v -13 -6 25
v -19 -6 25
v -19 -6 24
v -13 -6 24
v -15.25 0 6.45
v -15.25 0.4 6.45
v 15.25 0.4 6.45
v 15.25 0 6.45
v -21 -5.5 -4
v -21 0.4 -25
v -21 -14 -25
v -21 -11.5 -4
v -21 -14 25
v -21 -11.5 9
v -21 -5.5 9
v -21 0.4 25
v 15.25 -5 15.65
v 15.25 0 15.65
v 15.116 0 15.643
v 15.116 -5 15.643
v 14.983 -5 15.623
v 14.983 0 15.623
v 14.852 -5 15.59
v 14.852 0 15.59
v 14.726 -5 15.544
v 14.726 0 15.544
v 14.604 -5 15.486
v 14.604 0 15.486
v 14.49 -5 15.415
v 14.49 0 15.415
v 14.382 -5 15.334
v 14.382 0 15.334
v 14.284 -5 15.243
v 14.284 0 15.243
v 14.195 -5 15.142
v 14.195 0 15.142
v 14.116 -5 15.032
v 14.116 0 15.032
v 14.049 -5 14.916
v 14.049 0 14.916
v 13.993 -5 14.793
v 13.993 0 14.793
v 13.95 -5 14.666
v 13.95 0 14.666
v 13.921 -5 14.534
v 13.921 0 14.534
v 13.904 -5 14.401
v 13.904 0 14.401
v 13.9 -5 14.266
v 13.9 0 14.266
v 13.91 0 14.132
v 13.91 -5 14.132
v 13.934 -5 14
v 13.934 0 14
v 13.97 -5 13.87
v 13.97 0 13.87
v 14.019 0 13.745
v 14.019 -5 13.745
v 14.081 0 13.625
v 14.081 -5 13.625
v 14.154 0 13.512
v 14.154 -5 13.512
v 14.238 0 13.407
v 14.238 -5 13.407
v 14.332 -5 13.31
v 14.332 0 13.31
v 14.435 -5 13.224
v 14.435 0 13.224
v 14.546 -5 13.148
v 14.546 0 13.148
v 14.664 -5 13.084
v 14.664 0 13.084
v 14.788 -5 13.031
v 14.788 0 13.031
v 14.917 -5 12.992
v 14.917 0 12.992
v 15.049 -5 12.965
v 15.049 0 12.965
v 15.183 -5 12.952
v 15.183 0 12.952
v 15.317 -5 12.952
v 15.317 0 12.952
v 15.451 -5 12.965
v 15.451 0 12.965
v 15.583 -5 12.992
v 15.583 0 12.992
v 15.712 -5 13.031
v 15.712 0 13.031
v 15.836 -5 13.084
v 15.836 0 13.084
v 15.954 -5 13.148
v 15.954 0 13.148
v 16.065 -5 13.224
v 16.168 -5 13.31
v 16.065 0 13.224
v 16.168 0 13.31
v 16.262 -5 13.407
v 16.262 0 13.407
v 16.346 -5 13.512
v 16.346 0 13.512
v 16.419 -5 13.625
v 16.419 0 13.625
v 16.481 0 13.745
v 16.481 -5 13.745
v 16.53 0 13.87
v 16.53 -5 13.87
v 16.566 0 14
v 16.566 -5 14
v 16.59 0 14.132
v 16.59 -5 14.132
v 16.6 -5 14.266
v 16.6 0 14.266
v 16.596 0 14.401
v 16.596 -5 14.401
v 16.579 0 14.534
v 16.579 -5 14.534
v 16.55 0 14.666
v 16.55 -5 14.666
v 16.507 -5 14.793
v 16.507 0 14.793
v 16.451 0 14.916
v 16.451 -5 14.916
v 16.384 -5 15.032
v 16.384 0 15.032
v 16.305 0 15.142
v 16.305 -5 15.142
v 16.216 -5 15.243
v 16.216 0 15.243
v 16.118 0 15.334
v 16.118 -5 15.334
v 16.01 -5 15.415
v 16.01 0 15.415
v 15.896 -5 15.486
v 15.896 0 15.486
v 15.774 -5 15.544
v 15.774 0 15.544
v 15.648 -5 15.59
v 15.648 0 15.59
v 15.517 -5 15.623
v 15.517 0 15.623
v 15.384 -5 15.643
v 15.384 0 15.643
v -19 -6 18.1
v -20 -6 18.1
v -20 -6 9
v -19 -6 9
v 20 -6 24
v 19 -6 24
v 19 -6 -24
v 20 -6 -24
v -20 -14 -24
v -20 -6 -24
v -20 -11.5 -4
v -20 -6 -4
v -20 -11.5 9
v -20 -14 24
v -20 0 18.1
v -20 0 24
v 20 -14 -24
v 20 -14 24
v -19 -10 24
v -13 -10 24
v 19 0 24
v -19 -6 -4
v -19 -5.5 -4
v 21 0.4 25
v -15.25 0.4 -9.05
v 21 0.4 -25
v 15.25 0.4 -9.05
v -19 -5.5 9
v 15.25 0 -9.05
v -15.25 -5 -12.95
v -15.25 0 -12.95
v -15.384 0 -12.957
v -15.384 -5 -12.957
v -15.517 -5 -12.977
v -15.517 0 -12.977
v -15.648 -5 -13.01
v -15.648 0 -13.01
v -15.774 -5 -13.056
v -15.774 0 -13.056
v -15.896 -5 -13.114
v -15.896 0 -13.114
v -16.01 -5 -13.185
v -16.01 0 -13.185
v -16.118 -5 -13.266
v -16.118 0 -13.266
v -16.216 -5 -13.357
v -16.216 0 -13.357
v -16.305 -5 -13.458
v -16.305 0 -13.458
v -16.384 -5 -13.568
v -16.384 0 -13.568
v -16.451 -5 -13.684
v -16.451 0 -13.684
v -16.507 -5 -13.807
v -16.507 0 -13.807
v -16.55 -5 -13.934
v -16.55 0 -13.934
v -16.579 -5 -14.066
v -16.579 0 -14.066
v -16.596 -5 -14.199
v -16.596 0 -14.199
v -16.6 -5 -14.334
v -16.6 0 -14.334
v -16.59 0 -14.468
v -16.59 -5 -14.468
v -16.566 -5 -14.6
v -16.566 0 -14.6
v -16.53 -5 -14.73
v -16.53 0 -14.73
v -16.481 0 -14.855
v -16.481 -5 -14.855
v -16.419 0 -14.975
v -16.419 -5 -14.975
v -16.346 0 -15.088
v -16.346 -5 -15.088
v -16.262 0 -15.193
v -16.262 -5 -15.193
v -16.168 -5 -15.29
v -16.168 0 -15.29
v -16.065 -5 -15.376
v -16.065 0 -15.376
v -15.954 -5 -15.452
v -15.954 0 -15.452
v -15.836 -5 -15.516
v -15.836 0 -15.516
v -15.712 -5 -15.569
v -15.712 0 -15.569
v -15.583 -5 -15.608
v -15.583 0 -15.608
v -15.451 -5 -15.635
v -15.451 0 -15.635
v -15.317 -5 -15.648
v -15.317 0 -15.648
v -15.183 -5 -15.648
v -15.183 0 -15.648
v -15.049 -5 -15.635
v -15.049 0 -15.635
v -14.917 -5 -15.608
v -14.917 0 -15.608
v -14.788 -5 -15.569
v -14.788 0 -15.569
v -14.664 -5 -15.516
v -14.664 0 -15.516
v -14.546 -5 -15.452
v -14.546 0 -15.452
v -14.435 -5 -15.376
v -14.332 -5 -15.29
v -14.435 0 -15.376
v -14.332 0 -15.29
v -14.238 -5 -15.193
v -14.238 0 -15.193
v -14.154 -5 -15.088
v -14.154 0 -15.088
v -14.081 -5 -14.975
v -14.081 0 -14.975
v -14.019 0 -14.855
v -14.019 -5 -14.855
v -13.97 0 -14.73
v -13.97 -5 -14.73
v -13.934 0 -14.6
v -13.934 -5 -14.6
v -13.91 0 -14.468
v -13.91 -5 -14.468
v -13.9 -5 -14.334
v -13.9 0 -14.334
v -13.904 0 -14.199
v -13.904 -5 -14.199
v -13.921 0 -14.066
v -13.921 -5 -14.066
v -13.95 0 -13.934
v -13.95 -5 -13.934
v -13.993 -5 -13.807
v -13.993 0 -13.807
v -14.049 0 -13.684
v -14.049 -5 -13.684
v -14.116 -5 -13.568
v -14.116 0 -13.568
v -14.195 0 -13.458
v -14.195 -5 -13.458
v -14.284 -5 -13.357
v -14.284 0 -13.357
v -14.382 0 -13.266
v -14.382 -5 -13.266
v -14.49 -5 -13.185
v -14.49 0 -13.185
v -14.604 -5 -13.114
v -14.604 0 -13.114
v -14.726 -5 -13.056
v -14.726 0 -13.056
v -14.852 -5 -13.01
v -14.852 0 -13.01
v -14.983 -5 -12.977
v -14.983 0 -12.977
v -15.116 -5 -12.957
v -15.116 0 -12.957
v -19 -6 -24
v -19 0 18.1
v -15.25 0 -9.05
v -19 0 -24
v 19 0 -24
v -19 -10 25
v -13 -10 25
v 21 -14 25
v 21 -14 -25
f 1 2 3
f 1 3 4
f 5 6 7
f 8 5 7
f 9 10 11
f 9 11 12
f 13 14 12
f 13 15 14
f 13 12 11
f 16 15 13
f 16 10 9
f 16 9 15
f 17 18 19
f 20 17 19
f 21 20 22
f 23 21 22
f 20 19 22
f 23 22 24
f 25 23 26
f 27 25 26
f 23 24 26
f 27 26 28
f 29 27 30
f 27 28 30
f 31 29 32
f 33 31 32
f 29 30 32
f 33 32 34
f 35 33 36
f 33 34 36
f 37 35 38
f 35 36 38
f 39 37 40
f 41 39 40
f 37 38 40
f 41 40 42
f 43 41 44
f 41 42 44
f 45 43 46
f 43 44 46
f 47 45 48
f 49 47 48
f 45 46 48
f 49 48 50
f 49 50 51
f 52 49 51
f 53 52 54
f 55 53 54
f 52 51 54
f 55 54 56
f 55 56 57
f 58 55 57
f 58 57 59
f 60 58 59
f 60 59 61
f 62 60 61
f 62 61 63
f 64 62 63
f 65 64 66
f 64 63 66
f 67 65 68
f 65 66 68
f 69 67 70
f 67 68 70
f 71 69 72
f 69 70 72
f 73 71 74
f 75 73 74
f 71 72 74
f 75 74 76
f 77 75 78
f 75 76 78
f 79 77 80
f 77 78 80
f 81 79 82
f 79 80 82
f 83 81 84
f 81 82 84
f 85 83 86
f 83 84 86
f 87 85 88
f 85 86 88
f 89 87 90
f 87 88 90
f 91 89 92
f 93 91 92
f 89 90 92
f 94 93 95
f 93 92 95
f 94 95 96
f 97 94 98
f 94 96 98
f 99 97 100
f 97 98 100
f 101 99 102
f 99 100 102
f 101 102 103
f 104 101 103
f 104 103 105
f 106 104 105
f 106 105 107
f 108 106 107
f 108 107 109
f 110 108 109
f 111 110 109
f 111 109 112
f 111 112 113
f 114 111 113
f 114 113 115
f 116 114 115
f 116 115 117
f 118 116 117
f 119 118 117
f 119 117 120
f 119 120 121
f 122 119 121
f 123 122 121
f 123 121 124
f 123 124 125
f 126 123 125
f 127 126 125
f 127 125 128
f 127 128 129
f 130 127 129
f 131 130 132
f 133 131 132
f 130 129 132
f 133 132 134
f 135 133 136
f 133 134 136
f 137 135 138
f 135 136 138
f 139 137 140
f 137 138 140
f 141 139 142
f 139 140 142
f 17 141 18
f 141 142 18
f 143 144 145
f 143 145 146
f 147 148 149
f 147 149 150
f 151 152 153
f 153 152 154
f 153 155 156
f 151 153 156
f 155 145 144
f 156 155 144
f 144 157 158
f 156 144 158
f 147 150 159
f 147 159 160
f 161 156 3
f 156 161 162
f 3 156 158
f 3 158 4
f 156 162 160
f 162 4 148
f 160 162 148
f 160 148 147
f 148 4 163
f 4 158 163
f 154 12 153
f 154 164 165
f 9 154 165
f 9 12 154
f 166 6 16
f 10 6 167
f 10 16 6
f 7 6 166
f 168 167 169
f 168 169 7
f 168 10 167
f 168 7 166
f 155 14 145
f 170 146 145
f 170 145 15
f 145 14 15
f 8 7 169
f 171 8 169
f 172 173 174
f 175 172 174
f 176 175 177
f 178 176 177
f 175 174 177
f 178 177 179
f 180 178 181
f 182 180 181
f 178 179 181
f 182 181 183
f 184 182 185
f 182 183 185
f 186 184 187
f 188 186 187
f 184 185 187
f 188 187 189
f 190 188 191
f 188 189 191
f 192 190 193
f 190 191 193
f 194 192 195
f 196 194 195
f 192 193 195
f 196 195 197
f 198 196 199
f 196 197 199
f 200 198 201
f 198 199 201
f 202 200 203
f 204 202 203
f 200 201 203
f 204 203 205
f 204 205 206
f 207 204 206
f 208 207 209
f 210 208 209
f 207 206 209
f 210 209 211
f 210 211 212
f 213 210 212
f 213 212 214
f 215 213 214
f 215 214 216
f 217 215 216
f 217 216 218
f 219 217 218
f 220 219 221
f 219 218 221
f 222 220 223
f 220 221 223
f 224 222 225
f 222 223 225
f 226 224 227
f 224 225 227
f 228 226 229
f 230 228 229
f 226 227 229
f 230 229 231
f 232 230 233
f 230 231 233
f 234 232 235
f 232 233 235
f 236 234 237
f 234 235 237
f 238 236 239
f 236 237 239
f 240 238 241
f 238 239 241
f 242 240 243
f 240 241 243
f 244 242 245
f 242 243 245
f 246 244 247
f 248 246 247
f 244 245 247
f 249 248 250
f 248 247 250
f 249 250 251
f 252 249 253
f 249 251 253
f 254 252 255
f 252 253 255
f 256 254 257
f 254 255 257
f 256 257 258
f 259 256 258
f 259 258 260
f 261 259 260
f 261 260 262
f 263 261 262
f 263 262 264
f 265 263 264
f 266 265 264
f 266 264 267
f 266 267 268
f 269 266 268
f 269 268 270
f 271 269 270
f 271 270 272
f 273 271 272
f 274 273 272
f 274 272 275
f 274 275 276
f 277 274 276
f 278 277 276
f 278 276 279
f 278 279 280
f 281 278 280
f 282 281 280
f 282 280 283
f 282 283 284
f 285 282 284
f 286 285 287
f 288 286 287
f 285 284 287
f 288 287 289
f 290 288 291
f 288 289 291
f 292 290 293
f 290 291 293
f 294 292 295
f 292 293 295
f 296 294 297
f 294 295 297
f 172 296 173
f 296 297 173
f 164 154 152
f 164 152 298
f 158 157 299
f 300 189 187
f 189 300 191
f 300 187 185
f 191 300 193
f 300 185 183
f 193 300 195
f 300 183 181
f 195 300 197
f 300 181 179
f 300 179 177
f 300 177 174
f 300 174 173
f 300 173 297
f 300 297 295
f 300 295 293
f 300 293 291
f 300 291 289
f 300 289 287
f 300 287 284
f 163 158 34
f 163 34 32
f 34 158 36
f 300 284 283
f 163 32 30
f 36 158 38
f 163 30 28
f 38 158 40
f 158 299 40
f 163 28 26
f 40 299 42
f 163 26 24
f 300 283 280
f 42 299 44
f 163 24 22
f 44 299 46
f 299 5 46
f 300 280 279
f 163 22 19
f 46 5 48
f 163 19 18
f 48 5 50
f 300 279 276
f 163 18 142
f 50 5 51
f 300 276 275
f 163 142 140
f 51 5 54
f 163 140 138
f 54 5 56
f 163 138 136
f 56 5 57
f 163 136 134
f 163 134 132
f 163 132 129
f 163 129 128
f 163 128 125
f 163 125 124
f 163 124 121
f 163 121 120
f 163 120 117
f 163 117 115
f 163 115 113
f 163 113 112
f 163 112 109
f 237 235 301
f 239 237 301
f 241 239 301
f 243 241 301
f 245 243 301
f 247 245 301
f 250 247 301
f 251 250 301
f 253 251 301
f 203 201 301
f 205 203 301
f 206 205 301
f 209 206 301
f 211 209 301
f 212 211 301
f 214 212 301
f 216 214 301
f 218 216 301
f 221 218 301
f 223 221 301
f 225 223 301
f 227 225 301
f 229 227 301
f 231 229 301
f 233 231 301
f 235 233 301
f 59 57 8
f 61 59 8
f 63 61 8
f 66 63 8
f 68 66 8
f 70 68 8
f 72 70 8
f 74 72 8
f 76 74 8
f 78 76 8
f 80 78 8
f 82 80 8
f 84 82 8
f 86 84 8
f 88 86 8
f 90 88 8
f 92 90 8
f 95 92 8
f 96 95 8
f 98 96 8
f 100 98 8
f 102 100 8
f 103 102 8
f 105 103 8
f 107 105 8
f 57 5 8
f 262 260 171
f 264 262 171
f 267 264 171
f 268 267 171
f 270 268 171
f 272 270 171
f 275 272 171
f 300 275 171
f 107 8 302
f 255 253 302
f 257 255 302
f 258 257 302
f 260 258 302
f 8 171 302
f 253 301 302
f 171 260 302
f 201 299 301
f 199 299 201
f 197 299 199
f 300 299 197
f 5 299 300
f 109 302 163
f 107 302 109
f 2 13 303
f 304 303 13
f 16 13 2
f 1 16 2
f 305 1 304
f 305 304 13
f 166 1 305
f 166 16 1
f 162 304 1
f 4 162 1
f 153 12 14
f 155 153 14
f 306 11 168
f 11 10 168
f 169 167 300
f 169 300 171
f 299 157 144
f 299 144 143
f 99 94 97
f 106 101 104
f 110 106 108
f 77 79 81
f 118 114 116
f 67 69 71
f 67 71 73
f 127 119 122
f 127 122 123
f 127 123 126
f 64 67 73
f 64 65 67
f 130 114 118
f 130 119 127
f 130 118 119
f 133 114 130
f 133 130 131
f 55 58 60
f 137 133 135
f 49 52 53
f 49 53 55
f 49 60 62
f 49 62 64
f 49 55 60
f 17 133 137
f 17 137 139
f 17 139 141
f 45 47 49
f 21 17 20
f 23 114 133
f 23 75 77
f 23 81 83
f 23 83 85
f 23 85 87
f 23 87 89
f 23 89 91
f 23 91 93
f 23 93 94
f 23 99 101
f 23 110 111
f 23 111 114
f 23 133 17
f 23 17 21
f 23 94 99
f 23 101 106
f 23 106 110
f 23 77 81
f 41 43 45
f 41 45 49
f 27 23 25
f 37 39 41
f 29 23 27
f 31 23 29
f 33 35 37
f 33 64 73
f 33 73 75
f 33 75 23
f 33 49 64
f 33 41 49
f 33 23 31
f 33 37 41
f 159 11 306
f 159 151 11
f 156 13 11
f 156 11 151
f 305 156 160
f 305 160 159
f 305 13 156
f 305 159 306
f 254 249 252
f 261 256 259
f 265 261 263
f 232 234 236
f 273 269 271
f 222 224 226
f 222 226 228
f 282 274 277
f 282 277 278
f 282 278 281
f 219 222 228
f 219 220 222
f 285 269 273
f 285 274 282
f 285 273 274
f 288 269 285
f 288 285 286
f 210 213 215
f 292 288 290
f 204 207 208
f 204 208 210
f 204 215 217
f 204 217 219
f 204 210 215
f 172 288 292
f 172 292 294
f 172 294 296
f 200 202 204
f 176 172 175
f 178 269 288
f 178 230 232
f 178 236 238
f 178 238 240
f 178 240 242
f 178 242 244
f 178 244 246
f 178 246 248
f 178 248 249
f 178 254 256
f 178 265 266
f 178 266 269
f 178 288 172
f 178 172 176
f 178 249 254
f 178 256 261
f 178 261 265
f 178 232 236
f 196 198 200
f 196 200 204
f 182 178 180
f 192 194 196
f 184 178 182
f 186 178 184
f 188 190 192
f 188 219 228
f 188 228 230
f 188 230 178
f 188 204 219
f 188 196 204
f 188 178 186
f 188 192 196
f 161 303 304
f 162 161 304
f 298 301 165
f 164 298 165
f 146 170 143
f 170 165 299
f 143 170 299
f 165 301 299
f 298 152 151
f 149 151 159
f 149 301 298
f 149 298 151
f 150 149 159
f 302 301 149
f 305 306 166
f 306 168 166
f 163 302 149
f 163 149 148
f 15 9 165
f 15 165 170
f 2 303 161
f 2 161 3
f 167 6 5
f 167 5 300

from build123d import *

# Parameters (mm, degrees)
SKETCH_1_W             = 42
SKETCH_1_H             = 50
BODY_DEPTH             = 0.4
SKETCH_3_R             = 1.35
OLED_PILLAR_DEPTH      = 5
OLED_WINDOW_REACH      = 35.093
SKETCH_2_W             = 30.5
SKETCH_2_H             = 15.5
SKETCH_4_W             = 42
SKETCH_4_H             = 50
SKETCH_4_W_2           = 40
SKETCH_4_H_2           = 48
FARMFEELWALL_DEPTH     = 14
SKETCH_5_W             = 1
SKETCH_5_H             = 42.1
SKETCH_5_H_2           = 48
ESPSUPPORT_DEPTH       = 6
MICRO5PIN_WINDOW_REACH = 52.843
SKETCH_7_W             = 13
SKETCH_7_H             = 6
RESET_WINDOW_REACH     = 58.009
SKETCH_9_W             = 6
SKETCH_9_H             = 4


with BuildPart() as part:
    # 스케치1 → Body (new body)
    with BuildSketch(Plane(origin=(0, 0, 0), x_dir=(1, 0, 0), z_dir=(0, 1, 0))):
        Rectangle(SKETCH_1_W, SKETCH_1_H)
    extrude(amount=BODY_DEPTH)

    # 스케치3 → OLED_pillar (add)
    with BuildSketch(Plane.XZ):
        with Locations(Location((15.25, 14.3, 0), (0, 0, 90))):
            Circle(SKETCH_3_R)
        with Locations(Location((-15.25, -14.3, 0), (0, 0, 90))):
            Circle(SKETCH_3_R)
    extrude(amount=OLED_PILLAR_DEPTH)

    # 스케치2 → OLED_window (cut, up to next)
    with BuildSketch(Plane(origin=(0, 0.4, 0), x_dir=(1, 0, 0), z_dir=(0, 1, 0)), mode=Mode.PRIVATE) as oled_window_sk1:
        with Locations((0, 1.3)):
            Rectangle(SKETCH_2_W, SKETCH_2_H)
    oled_window_tool1 = extrude(oled_window_sk1.sketch, amount=-OLED_WINDOW_REACH, mode=Mode.PRIVATE) & part.part
    add(oled_window_tool1.solids().sort_by_distance((0, 0.4, -1.3))[0], mode=Mode.SUBTRACT)

    # 스케치4 → FarmFeelWall (add)
    with BuildSketch(Plane.XZ):
        Rectangle(SKETCH_4_W, SKETCH_4_H)
        Rectangle(SKETCH_4_W_2, SKETCH_4_H_2, mode=Mode.SUBTRACT)
    extrude(amount=FARMFEELWALL_DEPTH)

    # 스케치5 → EspSupport (add)
    with BuildSketch(Plane.XZ):
        with Locations((-19.5, -2.95)):
            Rectangle(SKETCH_5_W, SKETCH_5_H)
        with Locations((19.5, 0)):
            Rectangle(SKETCH_5_W, SKETCH_5_H_2)
    extrude(amount=ESPSUPPORT_DEPTH)

    # 스케치7 → micro5pin_window (cut, up to next)
    with BuildSketch(Plane.ZY.offset(21), mode=Mode.PRIVATE) as micro5pin_window_sk1:
        with Locations((2.5, -8.5)):
            Rectangle(SKETCH_7_W, SKETCH_7_H)
    micro5pin_window_tool1 = extrude(micro5pin_window_sk1.sketch, amount=-MICRO5PIN_WINDOW_REACH, mode=Mode.PRIVATE) & part.part
    add(micro5pin_window_tool1.solids().sort_by_distance((-21, -8.5, 2.5))[0], mode=Mode.SUBTRACT)

    # 스케치9 → reset_window (cut, up to next)
    with BuildSketch(Plane.XY.offset(25), mode=Mode.PRIVATE) as reset_window_sk1:
        with Locations((-16, -8)):
            Rectangle(SKETCH_9_W, SKETCH_9_H)
    reset_window_tool1 = extrude(reset_window_sk1.sketch, amount=-RESET_WINDOW_REACH, mode=Mode.PRIVATE) & part.part
    add(reset_window_tool1.solids().sort_by_distance((-16, -8, 25))[0], mode=Mode.SUBTRACT)


solid = part.part
